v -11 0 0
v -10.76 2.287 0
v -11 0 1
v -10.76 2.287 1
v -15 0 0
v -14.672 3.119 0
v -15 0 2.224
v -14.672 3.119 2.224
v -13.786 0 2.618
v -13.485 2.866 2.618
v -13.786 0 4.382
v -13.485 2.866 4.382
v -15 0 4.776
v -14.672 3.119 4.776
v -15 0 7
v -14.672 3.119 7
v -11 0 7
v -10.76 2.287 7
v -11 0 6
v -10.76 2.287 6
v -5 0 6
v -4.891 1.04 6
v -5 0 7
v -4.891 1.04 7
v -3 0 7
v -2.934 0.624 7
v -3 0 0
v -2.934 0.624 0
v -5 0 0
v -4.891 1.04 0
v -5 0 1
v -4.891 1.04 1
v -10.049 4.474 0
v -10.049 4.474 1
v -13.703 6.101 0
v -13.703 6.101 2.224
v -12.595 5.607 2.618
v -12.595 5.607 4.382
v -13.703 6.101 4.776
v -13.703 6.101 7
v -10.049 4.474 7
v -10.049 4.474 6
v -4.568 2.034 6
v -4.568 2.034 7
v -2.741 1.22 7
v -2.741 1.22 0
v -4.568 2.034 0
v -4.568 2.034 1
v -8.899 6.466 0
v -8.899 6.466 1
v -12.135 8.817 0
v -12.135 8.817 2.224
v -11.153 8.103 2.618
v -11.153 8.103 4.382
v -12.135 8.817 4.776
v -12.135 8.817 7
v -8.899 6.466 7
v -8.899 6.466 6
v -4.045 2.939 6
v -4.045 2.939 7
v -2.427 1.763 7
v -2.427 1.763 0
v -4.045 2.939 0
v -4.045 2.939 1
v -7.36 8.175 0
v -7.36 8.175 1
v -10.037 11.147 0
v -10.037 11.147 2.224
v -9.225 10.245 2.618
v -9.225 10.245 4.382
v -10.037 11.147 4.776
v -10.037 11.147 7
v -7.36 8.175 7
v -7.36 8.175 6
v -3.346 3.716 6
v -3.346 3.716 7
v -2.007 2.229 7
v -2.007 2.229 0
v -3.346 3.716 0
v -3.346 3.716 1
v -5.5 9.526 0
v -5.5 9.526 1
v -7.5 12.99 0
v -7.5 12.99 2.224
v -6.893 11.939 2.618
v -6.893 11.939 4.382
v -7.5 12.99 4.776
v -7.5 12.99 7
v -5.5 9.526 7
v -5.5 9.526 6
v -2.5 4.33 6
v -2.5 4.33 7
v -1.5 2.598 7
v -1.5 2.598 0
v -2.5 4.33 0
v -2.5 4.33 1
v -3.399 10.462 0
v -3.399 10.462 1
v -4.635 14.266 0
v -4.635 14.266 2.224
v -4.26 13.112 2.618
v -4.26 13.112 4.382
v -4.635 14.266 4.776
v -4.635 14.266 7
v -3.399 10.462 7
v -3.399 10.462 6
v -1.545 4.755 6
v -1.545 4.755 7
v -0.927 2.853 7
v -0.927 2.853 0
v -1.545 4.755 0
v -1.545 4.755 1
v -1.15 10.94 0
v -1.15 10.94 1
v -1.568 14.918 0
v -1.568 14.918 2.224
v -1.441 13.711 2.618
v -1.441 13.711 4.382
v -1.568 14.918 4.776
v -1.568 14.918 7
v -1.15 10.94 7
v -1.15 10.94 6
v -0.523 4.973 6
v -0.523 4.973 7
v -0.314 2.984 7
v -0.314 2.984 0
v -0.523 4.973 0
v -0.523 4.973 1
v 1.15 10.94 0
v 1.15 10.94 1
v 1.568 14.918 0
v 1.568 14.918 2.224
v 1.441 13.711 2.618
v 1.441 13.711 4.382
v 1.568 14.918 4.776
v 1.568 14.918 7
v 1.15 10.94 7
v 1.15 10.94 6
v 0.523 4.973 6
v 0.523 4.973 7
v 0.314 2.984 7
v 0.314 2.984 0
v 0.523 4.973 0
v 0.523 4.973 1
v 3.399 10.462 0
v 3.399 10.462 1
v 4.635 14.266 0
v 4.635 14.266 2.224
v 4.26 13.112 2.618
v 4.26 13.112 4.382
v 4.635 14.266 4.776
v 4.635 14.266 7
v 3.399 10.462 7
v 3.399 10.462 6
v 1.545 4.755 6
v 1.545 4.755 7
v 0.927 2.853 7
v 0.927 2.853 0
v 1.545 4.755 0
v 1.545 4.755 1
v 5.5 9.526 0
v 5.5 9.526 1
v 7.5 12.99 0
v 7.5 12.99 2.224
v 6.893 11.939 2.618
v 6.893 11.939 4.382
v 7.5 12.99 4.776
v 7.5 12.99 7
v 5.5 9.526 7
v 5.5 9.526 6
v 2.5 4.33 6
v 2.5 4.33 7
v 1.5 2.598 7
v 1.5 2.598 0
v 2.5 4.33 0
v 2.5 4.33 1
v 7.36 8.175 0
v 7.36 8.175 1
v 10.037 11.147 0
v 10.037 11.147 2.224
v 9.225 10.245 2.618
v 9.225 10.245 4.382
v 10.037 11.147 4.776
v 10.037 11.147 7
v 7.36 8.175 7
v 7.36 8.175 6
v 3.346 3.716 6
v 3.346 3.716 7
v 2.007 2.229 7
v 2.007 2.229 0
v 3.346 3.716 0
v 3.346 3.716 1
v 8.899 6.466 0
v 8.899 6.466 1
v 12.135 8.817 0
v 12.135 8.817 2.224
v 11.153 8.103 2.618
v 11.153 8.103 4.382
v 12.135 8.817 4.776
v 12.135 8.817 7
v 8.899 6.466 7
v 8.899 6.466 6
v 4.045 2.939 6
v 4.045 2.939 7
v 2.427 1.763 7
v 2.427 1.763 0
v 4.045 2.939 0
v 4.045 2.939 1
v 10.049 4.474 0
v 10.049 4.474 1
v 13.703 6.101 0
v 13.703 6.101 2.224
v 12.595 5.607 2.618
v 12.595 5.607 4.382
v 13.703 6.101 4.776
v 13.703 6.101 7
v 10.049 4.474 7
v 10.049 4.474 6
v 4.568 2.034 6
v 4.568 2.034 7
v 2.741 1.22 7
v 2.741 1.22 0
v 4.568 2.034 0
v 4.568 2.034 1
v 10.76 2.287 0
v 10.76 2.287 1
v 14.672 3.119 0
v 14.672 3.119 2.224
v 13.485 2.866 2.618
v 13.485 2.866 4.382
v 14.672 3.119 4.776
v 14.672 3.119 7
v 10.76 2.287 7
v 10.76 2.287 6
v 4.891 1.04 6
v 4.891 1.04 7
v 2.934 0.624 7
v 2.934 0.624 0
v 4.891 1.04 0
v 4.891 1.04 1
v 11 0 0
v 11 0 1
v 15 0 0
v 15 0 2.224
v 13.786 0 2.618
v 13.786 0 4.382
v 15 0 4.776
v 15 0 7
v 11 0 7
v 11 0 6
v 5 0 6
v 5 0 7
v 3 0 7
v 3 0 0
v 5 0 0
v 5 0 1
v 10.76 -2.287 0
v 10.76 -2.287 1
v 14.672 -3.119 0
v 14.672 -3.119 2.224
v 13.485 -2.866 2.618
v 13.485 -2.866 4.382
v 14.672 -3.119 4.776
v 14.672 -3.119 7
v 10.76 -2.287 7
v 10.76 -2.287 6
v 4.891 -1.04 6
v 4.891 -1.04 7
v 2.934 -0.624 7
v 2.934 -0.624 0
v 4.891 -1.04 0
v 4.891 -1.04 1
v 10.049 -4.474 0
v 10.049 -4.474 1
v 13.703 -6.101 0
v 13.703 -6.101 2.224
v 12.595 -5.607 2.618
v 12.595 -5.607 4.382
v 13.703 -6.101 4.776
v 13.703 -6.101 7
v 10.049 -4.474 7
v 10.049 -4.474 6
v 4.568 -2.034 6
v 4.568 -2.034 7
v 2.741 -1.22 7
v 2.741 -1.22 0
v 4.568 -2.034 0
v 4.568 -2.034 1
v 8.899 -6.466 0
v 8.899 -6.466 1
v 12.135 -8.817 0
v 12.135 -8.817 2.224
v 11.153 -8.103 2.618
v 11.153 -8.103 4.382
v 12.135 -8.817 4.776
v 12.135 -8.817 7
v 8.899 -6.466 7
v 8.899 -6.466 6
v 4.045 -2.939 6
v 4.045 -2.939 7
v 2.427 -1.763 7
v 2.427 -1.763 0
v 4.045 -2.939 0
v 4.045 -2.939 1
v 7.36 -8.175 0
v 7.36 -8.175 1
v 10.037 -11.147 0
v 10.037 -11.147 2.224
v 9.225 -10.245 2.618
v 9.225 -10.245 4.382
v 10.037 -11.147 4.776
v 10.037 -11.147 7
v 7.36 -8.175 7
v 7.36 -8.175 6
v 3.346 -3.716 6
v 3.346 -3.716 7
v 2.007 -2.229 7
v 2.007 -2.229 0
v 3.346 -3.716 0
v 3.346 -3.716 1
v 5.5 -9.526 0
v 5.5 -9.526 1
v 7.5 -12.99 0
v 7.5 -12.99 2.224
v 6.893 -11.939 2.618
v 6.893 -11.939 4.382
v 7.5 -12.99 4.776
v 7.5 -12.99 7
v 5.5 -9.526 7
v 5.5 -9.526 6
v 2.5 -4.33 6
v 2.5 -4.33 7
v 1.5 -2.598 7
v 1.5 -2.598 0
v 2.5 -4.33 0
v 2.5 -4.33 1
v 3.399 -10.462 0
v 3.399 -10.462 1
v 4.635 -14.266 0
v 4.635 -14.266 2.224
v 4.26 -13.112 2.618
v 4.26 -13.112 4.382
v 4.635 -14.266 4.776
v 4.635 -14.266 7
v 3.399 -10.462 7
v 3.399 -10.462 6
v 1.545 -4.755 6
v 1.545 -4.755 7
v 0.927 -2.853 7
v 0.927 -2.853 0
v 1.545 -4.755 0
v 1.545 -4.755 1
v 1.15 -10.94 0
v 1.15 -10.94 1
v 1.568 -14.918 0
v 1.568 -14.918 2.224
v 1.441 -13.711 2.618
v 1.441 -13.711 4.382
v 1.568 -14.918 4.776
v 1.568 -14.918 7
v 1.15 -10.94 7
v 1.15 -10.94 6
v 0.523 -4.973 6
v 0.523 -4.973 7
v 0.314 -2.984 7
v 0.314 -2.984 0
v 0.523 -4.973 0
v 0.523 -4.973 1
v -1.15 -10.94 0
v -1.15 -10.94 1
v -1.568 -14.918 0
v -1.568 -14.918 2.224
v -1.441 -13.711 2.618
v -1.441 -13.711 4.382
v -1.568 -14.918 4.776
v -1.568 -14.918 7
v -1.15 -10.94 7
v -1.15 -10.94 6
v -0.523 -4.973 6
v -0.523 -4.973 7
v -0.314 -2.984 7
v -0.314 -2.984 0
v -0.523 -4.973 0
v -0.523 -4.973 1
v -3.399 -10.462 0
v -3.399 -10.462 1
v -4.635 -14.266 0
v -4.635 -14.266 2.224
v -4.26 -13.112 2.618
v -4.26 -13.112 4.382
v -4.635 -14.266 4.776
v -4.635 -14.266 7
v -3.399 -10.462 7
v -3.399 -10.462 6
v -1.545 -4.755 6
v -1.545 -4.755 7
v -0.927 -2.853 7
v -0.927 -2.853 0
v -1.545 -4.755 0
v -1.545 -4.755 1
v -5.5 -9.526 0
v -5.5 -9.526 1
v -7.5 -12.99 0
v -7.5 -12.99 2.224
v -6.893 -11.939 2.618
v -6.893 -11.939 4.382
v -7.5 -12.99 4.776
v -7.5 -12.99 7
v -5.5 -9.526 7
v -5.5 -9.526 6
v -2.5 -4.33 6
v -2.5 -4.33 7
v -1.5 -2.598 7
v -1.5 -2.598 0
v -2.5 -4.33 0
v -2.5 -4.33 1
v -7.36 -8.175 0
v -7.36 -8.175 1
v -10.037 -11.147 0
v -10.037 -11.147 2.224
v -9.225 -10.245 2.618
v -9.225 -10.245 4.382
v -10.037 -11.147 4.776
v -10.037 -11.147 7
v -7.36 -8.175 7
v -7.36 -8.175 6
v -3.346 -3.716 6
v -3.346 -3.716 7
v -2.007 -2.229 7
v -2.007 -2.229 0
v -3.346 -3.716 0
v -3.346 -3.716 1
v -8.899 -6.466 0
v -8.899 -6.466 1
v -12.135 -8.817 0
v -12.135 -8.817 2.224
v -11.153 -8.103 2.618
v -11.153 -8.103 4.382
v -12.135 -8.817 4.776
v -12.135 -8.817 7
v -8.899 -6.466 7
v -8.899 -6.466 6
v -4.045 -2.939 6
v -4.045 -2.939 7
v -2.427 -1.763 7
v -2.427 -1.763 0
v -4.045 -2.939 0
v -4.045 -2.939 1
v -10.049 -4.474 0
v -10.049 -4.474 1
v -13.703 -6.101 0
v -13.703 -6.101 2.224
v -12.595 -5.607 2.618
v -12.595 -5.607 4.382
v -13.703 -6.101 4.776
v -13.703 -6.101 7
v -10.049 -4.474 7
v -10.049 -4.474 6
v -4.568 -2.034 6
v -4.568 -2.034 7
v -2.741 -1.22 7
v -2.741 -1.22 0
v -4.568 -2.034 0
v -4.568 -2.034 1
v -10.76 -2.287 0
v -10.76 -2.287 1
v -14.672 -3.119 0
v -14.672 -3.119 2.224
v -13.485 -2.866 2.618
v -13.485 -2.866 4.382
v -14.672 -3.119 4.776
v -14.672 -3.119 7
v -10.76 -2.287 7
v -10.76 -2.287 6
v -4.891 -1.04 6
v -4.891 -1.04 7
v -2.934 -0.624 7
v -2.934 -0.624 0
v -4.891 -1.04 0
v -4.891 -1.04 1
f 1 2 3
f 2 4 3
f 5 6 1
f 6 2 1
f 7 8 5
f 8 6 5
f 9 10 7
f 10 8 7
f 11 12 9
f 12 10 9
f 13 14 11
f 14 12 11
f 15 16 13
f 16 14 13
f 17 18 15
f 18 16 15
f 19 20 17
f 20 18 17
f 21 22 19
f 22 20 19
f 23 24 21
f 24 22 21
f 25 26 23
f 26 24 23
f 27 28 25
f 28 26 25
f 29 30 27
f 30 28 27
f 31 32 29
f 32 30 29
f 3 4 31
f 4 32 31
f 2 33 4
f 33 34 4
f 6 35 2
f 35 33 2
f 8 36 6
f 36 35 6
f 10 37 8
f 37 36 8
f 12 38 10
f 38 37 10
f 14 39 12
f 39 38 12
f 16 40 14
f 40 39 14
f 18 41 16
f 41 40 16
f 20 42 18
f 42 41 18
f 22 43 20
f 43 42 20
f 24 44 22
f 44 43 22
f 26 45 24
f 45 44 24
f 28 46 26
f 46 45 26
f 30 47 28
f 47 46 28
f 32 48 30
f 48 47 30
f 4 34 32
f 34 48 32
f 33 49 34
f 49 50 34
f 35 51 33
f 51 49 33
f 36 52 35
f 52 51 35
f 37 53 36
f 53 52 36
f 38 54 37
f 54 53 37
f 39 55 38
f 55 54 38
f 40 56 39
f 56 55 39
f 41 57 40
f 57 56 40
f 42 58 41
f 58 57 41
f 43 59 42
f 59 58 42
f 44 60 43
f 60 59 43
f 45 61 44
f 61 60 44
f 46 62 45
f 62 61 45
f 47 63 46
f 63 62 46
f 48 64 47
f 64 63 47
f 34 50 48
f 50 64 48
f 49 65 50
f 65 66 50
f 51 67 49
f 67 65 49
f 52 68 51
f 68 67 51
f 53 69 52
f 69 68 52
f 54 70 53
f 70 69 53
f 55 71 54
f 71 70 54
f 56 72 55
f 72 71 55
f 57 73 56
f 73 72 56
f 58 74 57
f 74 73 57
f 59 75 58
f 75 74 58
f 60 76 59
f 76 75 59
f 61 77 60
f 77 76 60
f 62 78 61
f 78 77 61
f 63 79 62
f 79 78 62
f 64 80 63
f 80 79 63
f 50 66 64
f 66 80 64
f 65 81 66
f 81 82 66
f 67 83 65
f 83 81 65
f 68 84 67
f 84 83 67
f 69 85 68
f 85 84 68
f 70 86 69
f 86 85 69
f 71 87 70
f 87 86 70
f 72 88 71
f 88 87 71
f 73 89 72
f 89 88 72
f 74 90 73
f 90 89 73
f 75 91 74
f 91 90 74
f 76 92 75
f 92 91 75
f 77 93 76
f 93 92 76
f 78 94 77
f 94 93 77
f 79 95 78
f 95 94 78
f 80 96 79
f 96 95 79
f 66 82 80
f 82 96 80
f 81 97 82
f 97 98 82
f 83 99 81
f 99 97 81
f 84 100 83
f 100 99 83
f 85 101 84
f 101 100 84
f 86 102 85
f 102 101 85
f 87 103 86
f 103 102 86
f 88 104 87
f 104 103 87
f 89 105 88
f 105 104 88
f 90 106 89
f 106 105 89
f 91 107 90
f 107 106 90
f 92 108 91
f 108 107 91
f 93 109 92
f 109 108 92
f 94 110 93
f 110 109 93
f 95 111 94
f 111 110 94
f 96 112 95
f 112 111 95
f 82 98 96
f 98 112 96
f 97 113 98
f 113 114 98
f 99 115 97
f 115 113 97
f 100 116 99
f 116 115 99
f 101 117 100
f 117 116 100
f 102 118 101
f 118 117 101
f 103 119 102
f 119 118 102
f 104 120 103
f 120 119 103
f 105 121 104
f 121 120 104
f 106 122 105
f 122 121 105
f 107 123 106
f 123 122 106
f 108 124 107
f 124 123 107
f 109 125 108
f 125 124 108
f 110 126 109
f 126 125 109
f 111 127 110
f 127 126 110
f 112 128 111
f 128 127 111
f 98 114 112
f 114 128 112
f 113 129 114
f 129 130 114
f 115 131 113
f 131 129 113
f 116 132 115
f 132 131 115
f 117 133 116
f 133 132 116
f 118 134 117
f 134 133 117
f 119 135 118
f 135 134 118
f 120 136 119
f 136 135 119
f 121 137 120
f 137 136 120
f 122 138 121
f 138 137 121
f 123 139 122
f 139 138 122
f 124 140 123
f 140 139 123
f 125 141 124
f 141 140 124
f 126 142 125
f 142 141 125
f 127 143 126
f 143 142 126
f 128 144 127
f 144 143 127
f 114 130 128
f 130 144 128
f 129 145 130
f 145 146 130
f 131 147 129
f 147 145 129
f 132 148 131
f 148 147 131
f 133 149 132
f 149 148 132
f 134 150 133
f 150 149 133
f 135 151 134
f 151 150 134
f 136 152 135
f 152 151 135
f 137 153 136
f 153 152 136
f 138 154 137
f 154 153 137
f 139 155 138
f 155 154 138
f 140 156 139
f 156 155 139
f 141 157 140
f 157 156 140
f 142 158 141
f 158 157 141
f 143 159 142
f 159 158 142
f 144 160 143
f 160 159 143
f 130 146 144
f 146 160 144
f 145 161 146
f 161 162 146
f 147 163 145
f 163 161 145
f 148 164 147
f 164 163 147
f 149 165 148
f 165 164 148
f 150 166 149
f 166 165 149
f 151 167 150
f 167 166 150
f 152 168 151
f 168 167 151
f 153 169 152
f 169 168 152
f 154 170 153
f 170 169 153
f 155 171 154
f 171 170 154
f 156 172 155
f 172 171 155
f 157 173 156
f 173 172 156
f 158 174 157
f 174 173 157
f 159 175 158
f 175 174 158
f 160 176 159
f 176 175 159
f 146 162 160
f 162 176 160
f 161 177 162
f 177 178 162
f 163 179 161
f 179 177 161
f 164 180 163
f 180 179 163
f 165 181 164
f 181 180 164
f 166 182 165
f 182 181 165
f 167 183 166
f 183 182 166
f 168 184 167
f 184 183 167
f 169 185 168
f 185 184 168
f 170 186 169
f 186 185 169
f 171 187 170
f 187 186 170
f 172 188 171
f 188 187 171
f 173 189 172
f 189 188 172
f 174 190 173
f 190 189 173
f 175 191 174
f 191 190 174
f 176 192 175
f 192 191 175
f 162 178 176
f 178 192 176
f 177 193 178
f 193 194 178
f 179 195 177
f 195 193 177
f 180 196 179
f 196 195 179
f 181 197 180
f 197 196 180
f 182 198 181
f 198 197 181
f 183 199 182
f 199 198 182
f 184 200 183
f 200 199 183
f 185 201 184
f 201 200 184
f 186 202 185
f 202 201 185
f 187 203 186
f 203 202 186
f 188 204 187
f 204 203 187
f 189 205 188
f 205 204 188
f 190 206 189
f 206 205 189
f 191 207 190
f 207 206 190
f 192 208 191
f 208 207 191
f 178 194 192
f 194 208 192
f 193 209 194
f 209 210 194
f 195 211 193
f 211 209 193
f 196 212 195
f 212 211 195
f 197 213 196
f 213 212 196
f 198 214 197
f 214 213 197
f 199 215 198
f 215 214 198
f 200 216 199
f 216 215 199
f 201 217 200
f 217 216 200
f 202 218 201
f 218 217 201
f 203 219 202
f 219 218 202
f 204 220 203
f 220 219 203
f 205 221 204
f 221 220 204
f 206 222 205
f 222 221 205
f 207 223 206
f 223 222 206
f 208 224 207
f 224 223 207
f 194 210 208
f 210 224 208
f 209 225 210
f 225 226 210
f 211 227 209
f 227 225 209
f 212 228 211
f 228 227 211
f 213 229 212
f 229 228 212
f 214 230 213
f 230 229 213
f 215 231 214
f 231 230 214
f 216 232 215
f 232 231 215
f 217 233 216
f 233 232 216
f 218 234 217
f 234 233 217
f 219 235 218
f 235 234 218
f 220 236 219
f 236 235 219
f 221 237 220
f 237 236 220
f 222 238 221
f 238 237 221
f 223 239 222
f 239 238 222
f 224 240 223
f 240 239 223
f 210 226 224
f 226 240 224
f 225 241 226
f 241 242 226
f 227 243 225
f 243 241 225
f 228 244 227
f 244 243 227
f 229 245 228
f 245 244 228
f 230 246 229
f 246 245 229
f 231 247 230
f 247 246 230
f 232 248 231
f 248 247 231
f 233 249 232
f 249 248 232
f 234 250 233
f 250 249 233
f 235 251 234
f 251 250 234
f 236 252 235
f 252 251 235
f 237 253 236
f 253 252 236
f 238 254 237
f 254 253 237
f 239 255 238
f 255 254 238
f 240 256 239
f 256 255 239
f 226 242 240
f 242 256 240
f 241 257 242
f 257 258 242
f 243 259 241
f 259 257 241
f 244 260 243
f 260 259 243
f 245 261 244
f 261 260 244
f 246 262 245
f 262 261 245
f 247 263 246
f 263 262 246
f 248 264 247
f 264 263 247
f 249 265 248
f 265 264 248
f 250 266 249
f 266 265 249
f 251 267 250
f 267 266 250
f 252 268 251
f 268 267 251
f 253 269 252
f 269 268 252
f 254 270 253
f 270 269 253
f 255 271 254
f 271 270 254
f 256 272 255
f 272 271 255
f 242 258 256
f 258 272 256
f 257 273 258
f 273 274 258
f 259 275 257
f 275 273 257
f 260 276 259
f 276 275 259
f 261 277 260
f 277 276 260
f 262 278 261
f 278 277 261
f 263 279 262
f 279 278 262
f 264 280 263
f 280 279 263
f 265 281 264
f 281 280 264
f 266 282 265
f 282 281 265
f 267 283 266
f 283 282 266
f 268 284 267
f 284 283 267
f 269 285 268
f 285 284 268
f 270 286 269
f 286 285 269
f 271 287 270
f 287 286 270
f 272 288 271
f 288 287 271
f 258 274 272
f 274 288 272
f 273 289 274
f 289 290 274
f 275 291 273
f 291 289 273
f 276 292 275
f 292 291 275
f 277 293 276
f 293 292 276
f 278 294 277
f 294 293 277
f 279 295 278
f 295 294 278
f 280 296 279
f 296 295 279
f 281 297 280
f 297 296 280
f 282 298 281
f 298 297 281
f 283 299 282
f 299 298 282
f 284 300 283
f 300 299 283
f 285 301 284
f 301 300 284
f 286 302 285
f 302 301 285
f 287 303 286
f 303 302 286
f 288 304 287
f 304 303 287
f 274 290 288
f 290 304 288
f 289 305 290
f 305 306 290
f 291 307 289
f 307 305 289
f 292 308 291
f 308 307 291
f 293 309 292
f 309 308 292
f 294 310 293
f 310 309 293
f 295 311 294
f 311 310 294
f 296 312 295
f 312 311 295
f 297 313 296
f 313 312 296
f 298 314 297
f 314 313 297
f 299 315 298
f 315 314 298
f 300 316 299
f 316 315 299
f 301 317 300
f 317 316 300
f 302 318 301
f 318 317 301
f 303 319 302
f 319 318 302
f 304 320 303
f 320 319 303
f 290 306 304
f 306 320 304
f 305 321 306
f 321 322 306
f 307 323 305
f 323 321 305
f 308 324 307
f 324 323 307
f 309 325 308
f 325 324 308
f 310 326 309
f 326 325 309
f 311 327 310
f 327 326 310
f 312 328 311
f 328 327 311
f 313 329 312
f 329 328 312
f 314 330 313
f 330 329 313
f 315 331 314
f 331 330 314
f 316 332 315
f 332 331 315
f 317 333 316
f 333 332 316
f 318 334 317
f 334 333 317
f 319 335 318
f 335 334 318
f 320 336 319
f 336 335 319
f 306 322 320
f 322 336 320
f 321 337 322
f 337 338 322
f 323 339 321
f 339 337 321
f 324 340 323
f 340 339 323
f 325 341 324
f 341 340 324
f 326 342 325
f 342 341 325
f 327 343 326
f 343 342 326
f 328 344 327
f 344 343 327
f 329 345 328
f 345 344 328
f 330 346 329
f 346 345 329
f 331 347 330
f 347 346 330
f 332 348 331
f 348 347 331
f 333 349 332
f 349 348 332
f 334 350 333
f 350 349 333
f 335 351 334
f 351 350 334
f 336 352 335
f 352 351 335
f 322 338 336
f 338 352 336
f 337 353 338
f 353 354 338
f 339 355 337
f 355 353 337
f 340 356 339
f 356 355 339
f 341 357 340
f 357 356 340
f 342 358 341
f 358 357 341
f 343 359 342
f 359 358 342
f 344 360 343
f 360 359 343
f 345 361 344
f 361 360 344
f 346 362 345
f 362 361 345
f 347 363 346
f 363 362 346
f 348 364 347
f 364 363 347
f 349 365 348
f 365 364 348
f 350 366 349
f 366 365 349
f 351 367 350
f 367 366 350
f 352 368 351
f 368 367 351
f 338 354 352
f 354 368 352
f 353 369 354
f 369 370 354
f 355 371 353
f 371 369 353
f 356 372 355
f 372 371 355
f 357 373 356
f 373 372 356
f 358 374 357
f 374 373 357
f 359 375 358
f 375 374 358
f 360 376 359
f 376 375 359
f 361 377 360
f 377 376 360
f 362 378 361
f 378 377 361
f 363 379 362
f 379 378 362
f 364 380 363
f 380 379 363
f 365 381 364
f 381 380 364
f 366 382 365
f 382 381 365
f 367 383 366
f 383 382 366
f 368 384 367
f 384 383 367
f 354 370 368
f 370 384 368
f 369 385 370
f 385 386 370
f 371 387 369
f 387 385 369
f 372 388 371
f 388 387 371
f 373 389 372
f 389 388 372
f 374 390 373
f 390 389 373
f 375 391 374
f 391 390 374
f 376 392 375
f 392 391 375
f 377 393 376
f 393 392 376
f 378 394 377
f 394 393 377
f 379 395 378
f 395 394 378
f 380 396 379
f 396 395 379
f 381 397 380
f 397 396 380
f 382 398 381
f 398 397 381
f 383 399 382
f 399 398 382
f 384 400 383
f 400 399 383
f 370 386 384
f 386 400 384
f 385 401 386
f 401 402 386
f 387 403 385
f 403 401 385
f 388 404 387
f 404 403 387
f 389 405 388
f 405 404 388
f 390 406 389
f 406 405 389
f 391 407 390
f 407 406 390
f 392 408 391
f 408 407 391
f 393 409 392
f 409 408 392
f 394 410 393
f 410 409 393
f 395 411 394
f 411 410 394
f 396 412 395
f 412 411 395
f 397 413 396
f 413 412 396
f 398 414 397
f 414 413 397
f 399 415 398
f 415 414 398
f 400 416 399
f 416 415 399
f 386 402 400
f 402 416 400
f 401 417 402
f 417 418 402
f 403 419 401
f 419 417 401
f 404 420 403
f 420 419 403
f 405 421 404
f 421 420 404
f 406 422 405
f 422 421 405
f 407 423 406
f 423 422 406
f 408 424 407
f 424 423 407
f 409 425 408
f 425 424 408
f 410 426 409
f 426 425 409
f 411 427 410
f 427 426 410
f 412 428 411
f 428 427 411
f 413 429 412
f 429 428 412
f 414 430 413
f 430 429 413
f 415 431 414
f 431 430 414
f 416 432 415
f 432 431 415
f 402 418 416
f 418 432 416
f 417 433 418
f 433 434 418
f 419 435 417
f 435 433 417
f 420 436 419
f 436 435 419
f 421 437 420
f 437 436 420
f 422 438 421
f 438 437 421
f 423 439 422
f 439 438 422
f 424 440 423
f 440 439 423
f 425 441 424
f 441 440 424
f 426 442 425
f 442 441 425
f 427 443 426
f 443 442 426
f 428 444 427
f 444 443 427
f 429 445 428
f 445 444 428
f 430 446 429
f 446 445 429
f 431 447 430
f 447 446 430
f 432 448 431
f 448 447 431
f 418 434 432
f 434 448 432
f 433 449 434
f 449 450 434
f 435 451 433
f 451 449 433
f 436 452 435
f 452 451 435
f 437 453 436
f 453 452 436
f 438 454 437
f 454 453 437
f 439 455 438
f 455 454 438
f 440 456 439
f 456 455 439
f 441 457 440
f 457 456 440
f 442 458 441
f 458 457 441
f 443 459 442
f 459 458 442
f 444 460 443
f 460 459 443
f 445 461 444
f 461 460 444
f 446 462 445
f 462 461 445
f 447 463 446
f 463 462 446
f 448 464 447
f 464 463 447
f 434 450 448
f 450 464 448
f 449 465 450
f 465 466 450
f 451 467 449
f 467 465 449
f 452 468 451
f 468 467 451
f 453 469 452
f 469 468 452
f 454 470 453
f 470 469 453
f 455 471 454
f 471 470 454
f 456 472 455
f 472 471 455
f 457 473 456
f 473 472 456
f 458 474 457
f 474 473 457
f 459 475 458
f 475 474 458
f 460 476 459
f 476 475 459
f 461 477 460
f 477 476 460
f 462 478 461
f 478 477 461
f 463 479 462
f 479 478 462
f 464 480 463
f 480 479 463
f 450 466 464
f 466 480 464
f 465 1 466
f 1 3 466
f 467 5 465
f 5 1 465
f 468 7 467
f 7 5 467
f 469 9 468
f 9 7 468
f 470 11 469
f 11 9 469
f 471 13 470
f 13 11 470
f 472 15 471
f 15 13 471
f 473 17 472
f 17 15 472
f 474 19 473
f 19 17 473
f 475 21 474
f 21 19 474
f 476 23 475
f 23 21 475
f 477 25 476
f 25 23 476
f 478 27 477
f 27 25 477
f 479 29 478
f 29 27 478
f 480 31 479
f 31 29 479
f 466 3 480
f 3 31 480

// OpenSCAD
rotate_extrude(convexity = 10)
translate([3,0,0])
difference(){
square ([12,7],center = false);
translate([2,0,0]) 
  square ([6,1],center = false);
translate([2,6,0]) 
  square ([6,1],center = false);
translate([12,3.5,0]) circle(1.5);
}
